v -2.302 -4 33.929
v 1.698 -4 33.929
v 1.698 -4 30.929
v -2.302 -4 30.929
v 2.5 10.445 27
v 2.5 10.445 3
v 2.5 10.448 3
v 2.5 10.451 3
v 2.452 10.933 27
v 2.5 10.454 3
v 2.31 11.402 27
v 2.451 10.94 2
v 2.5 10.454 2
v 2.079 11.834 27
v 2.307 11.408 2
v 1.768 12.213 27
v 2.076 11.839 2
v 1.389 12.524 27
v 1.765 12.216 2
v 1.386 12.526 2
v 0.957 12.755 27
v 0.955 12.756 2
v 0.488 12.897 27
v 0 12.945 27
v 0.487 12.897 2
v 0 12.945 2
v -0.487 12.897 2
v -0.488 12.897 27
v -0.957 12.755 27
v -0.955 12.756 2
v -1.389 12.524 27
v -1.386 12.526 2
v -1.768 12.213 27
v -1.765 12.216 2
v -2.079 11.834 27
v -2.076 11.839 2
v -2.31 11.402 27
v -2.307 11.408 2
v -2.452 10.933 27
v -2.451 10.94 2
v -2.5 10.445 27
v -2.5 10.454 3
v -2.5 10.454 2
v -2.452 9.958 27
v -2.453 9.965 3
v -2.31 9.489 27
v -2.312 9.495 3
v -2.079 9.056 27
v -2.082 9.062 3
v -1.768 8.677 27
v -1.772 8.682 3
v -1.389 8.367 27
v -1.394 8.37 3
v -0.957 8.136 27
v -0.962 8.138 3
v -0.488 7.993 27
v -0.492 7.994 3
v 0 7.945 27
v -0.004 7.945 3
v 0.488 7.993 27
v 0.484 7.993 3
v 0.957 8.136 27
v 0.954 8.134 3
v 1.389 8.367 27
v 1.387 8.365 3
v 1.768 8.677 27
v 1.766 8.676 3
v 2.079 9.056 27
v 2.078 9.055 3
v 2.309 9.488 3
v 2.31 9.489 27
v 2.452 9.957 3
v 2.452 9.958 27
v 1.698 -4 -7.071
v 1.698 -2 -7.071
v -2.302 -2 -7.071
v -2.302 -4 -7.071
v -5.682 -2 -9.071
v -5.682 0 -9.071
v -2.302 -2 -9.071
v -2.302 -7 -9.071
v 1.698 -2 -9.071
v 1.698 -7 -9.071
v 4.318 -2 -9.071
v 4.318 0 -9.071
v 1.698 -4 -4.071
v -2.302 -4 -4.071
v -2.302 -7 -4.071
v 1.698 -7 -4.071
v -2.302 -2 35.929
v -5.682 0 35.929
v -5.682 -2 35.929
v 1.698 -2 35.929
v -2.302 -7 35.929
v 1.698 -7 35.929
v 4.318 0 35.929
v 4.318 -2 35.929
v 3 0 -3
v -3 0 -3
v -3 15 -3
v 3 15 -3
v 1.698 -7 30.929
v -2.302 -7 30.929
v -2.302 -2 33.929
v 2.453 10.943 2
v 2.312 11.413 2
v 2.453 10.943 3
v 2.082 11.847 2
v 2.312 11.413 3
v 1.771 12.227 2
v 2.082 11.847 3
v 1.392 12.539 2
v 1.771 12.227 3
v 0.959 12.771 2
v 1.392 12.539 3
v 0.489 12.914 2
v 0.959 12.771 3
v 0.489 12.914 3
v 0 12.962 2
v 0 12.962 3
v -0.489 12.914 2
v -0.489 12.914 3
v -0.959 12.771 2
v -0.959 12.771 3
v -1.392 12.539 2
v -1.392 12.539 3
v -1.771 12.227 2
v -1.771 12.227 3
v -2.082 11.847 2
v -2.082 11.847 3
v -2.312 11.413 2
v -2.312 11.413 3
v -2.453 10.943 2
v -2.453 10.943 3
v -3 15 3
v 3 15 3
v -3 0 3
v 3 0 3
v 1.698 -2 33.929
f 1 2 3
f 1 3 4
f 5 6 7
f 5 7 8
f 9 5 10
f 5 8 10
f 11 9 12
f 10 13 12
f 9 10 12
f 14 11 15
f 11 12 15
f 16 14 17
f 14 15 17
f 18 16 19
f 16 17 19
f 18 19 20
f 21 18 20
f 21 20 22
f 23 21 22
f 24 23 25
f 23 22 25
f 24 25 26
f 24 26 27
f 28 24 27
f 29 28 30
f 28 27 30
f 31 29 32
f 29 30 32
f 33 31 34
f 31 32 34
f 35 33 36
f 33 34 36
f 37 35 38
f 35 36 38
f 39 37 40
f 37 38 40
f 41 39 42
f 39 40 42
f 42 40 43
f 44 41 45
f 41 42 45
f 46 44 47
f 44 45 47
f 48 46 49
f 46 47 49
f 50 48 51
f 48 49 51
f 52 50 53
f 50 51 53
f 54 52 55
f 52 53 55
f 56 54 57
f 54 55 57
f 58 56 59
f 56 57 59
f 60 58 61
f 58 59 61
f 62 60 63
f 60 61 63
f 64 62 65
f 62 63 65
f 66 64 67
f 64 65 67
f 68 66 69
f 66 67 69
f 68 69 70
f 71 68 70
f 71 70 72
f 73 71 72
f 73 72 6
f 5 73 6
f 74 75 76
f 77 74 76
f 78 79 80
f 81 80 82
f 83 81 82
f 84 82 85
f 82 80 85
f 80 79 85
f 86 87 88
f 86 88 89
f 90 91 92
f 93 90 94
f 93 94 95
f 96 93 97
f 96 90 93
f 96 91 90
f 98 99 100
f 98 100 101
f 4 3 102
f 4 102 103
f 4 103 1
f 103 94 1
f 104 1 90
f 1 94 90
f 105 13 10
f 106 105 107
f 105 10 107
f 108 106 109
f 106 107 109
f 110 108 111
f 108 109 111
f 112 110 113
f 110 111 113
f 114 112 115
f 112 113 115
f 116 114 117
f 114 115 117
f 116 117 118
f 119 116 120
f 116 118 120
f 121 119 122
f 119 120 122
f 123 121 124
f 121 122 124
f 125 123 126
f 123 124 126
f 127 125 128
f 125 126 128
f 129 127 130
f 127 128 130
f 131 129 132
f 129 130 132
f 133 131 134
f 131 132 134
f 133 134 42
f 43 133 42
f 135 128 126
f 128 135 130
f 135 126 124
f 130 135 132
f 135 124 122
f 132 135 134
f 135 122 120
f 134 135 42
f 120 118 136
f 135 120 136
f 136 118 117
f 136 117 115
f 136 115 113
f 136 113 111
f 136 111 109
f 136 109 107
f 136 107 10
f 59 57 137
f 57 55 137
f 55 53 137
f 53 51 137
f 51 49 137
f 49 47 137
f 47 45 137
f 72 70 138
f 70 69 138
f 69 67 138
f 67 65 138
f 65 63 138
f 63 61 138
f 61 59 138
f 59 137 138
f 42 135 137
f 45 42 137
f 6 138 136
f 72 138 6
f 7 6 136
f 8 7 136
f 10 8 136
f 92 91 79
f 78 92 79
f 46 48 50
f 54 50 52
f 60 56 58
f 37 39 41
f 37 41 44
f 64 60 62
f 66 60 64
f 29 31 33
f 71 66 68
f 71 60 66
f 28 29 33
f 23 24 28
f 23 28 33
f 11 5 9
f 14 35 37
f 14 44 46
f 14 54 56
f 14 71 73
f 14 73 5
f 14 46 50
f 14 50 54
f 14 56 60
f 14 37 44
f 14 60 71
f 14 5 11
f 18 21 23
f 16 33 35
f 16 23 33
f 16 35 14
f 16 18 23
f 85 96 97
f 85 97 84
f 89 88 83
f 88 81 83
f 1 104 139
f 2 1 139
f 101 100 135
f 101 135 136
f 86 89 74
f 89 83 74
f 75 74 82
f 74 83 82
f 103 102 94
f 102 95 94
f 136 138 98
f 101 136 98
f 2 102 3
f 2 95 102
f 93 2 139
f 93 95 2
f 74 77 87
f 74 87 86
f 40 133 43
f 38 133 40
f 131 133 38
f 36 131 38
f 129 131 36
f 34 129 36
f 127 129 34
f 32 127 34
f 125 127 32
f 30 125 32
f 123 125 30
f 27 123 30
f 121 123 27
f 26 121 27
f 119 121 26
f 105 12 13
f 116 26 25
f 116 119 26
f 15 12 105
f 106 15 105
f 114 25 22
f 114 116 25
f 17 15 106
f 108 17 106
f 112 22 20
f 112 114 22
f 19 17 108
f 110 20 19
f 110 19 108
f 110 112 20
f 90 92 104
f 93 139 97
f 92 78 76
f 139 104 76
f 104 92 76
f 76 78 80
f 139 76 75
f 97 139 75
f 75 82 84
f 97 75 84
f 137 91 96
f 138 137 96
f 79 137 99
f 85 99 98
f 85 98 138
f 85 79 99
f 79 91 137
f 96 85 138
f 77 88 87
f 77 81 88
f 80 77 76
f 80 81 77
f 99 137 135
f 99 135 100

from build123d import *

# Parameters (mm, degrees)
SKETCH1_W           = 6
SKETCH1_H           = 6
BOSS_EXTRUDE1_DEPTH = 15
SKETCH3_W           = 10
SKETCH3_H           = 45
BOSS_EXTRUDE2_DEPTH = 2
SKETCH4_W           = 4
SKETCH4_H           = 5
BOSS_EXTRUDE3_DEPTH = 2
SKETCH5_W           = 4
SKETCH5_H           = 5
BOSS_EXTRUDE4_DEPTH = 2
SKETCH6_W           = 4
SKETCH6_H           = 3
BOSS_EXTRUDE5_DEPTH = 3
SKETCH7_W           = 4
SKETCH7_H           = 3
BOSS_EXTRUDE6_DEPTH = 3
SKETCH8_R           = 2.5
CUT_EXTRUDE1_DEPTH  = 1
SKETCH9_R           = 2.5
BOSS_EXTRUDE7_DEPTH = 25


with BuildPart() as part:
    # Sketch1 → Boss-Extrude1 (new body)
    with BuildSketch(Plane(origin=(0, 0, 0), x_dir=(1, 0, 0), z_dir=(0, 1, 0))):
        Rectangle(SKETCH1_W, SKETCH1_H)
    extrude(amount=BOSS_EXTRUDE1_DEPTH)

    # Sketch3 → Boss-Extrude2 (add)
    with BuildSketch(Plane(origin=(0, 0, 0), x_dir=(1, 0, 0), z_dir=(0, 1, 0))):
        with Locations((-0.682406889, -13.428719973)):
            Rectangle(SKETCH3_W, SKETCH3_H)
    extrude(amount=-BOSS_EXTRUDE2_DEPTH)

    # Sketch4 → Boss-Extrude3 (add)
    with BuildSketch(Plane.XY.offset(35.928719973)):
        with Locations((-0.302179452, -4.5)):
            Rectangle(SKETCH4_W, SKETCH4_H)
    extrude(amount=-BOSS_EXTRUDE3_DEPTH)

    # Sketch5 → Boss-Extrude4 (add)
    with BuildSketch(Plane(origin=(0, 0, -9.071280027), x_dir=(-1, 0, 0), z_dir=(0, 0, -1))):
        with Locations((0.302179452, -4.5)):
            Rectangle(SKETCH5_W, SKETCH5_H)
    extrude(amount=-BOSS_EXTRUDE4_DEPTH)

    # Sketch6 → Boss-Extrude5 (add)
    with BuildSketch(Plane(origin=(0, 0, 33.928719973), x_dir=(-1, 0, 0), z_dir=(0, 0, -1))):
        with Locations((0.302179452, -5.5)):
            Rectangle(SKETCH6_W, SKETCH6_H)
    extrude(amount=BOSS_EXTRUDE5_DEPTH)

    # Sketch7 → Boss-Extrude6 (add)
    with BuildSketch(Plane.XY.offset(-7.071280027)):
        with Locations((-0.302179452, -5.5)):
            Rectangle(SKETCH7_W, SKETCH7_H)
    extrude(amount=BOSS_EXTRUDE6_DEPTH)

    # Sketch8 → Cut-Extrude1 (cut)
    with BuildSketch(Plane.XY.offset(3)):
        with Locations((0, 10.46201193)):
            Circle(SKETCH8_R)
    extrude(amount=-CUT_EXTRUDE1_DEPTH, mode=Mode.SUBTRACT)

    # Sketch9 → Boss-Extrude7 (add)
    with BuildSketch(Plane.XY.offset(2)):
        with Locations((0, 10.44523286)):
            Circle(SKETCH9_R)
    extrude(amount=BOSS_EXTRUDE7_DEPTH)


solid = part.part
